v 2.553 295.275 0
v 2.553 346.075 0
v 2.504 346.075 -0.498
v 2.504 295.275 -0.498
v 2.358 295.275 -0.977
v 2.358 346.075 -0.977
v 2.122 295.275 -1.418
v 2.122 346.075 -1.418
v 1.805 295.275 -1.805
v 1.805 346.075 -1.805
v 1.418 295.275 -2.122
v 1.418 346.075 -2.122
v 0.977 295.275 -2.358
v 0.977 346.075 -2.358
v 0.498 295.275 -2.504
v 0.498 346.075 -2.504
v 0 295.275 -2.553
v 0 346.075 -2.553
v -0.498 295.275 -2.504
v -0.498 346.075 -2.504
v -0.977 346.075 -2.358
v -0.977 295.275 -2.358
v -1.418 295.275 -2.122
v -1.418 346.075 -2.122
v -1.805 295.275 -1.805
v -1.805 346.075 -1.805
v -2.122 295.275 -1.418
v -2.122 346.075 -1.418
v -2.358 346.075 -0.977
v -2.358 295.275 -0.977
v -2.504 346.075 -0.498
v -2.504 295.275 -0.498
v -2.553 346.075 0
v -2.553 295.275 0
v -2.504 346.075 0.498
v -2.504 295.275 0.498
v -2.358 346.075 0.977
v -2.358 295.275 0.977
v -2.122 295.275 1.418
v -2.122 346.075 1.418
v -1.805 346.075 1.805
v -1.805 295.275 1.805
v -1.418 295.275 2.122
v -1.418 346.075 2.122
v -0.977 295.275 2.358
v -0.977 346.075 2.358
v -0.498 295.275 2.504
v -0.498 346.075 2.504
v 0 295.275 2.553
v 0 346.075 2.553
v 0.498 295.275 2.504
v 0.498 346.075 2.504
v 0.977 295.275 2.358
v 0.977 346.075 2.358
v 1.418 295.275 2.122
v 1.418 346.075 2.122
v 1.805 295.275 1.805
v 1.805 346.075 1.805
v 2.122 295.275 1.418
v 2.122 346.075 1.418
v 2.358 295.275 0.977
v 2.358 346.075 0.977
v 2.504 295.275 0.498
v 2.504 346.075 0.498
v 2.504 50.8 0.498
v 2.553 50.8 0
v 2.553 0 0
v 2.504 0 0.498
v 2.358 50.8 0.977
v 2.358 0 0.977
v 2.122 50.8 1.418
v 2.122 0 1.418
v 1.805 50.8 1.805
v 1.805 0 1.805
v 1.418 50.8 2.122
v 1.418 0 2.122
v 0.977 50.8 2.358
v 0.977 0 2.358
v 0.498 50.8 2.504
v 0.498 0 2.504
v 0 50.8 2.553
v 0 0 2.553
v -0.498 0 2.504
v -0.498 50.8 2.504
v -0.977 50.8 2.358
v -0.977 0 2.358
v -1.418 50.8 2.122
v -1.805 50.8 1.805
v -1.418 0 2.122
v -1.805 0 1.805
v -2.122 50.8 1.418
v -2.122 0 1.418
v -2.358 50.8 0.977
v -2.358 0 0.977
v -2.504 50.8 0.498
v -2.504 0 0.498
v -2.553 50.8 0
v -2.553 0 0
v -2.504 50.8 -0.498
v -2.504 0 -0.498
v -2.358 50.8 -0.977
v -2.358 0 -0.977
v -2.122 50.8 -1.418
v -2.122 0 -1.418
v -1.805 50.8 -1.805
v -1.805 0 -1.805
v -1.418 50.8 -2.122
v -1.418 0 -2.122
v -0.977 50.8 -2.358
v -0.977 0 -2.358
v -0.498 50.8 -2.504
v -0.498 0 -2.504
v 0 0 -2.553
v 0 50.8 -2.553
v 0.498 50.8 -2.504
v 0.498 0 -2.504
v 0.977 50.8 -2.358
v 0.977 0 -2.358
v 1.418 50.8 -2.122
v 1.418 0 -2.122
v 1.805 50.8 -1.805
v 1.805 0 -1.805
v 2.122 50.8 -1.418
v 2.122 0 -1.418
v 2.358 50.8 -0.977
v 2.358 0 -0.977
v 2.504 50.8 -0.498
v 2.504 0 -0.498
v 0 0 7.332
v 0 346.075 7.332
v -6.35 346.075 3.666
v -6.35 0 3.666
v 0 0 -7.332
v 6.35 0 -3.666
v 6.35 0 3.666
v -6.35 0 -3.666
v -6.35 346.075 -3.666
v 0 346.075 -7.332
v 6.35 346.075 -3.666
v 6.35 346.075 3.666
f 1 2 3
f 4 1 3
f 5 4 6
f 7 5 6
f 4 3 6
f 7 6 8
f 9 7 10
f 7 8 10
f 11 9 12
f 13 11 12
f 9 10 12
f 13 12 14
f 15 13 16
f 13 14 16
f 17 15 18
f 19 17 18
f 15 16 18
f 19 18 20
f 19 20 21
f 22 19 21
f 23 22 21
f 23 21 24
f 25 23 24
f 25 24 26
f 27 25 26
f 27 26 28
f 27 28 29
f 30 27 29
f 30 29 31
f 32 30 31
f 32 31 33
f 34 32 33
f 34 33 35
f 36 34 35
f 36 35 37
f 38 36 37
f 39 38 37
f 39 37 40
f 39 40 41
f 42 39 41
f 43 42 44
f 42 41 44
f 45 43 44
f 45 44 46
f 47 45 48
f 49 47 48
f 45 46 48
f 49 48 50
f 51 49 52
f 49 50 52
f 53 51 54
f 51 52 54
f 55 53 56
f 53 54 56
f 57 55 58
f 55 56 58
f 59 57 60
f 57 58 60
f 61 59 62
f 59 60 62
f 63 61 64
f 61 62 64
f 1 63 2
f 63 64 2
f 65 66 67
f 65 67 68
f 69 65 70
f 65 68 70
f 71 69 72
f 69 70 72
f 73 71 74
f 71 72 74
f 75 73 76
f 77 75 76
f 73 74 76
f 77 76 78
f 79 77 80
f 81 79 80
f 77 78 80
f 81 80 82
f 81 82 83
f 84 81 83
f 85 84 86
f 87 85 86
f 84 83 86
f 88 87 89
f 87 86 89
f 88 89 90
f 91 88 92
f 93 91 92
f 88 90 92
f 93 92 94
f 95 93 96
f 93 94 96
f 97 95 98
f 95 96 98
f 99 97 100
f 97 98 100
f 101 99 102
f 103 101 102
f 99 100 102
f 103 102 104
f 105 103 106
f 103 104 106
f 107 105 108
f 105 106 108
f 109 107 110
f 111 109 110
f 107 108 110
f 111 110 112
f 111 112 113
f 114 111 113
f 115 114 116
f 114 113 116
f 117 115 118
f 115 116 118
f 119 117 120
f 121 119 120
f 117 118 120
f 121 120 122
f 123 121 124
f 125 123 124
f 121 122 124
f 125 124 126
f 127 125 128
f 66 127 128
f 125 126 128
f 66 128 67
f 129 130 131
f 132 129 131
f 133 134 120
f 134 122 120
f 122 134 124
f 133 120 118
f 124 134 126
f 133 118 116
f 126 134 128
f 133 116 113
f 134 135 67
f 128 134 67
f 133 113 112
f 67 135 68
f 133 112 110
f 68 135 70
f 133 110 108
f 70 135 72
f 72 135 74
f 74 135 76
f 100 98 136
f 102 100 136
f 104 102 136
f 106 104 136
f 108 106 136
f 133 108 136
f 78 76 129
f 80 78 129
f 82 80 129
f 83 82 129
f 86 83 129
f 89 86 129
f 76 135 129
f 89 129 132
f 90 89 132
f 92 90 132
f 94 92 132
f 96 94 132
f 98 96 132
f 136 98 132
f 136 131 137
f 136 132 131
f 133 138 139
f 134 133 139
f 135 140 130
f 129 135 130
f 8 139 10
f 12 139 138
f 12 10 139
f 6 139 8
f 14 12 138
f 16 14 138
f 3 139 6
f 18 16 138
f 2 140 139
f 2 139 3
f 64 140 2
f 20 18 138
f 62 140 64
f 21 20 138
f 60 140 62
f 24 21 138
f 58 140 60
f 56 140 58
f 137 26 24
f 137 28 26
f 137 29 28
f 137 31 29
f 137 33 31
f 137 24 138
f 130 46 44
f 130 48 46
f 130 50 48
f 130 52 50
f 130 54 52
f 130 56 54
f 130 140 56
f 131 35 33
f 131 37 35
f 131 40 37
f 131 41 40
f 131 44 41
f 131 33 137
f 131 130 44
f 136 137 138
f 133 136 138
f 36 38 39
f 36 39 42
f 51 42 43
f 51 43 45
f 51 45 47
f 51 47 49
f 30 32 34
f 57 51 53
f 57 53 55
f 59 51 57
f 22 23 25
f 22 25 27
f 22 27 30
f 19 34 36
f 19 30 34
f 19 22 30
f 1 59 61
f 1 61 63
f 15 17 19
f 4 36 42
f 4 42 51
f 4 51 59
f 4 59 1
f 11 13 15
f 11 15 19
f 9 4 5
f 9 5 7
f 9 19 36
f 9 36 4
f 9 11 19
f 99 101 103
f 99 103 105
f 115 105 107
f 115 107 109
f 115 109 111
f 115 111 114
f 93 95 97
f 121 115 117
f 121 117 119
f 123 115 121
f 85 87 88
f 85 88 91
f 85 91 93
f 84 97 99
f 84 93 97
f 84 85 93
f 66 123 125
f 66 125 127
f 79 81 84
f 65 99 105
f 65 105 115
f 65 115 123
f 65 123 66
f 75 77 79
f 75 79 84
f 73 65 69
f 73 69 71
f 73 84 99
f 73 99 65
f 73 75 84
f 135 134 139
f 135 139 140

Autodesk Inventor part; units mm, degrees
ref_plane "YZ Plane" through (0, 0, 0) normal (1, 0, 0) x (0, 1, 0)
ref_plane "XZ Plane" through (0, 0, 0) normal (0, 1, 0) x (-1, 0, 0)
ref_plane "XY Plane" through (0, 0, 0) normal (0, 0, 1) x (1, 0, 0)
sketch "Sketch1" plane through (0, 0, 0) normal (0, 1, 0) x (-1, 0, 0)
  line L0 (6.35, 3.6662) -> (6.35, -3.6662)
  line L1 (6.35, -3.6662) -> (0, -7.3323)
  line L2 (0, -7.3323) -> (-6.35, -3.6662)
  line L3 (-6.35, -3.6662) -> (-6.35, 3.6662)
  line L4 (-6.35, 3.6662) -> (0, 7.3323)
  line L5 (0, 7.3323) -> (6.35, 3.6662)
  point P0 (0, 0)
  point P1 (0, 0)
  dimension "d0" = 12.7
extrude "Extrusion1" add sketch "Sketch1" along normal blind 346.075
sketch "Sketch2" plane through (0, 0, 0) normal (0, -1, 0) x (1, 0, 0)
  circle A0 centre (0, 0) radius 2.5527
  dimension "d3" = 5.1054
extrude "Extrusion2" cut sketch "Sketch2" against normal blind 50.8
sketch "Sketch3" plane through (0, 346.075, 0) normal (0, 1, 0) x (1, 0, 0)
  circle A0 centre (0, 0) radius 2.5527
  dimension "d6" = 5.1054
extrude "Extrusion3" cut sketch "Sketch3" against normal blind 50.8
thread "Thread1" size "1/4-20 UNC" class "2B" standard "ANSI Unified Screw Threads" full length
properties part number "CORL_004_PivotShaft" material "Aluminum 6061"
